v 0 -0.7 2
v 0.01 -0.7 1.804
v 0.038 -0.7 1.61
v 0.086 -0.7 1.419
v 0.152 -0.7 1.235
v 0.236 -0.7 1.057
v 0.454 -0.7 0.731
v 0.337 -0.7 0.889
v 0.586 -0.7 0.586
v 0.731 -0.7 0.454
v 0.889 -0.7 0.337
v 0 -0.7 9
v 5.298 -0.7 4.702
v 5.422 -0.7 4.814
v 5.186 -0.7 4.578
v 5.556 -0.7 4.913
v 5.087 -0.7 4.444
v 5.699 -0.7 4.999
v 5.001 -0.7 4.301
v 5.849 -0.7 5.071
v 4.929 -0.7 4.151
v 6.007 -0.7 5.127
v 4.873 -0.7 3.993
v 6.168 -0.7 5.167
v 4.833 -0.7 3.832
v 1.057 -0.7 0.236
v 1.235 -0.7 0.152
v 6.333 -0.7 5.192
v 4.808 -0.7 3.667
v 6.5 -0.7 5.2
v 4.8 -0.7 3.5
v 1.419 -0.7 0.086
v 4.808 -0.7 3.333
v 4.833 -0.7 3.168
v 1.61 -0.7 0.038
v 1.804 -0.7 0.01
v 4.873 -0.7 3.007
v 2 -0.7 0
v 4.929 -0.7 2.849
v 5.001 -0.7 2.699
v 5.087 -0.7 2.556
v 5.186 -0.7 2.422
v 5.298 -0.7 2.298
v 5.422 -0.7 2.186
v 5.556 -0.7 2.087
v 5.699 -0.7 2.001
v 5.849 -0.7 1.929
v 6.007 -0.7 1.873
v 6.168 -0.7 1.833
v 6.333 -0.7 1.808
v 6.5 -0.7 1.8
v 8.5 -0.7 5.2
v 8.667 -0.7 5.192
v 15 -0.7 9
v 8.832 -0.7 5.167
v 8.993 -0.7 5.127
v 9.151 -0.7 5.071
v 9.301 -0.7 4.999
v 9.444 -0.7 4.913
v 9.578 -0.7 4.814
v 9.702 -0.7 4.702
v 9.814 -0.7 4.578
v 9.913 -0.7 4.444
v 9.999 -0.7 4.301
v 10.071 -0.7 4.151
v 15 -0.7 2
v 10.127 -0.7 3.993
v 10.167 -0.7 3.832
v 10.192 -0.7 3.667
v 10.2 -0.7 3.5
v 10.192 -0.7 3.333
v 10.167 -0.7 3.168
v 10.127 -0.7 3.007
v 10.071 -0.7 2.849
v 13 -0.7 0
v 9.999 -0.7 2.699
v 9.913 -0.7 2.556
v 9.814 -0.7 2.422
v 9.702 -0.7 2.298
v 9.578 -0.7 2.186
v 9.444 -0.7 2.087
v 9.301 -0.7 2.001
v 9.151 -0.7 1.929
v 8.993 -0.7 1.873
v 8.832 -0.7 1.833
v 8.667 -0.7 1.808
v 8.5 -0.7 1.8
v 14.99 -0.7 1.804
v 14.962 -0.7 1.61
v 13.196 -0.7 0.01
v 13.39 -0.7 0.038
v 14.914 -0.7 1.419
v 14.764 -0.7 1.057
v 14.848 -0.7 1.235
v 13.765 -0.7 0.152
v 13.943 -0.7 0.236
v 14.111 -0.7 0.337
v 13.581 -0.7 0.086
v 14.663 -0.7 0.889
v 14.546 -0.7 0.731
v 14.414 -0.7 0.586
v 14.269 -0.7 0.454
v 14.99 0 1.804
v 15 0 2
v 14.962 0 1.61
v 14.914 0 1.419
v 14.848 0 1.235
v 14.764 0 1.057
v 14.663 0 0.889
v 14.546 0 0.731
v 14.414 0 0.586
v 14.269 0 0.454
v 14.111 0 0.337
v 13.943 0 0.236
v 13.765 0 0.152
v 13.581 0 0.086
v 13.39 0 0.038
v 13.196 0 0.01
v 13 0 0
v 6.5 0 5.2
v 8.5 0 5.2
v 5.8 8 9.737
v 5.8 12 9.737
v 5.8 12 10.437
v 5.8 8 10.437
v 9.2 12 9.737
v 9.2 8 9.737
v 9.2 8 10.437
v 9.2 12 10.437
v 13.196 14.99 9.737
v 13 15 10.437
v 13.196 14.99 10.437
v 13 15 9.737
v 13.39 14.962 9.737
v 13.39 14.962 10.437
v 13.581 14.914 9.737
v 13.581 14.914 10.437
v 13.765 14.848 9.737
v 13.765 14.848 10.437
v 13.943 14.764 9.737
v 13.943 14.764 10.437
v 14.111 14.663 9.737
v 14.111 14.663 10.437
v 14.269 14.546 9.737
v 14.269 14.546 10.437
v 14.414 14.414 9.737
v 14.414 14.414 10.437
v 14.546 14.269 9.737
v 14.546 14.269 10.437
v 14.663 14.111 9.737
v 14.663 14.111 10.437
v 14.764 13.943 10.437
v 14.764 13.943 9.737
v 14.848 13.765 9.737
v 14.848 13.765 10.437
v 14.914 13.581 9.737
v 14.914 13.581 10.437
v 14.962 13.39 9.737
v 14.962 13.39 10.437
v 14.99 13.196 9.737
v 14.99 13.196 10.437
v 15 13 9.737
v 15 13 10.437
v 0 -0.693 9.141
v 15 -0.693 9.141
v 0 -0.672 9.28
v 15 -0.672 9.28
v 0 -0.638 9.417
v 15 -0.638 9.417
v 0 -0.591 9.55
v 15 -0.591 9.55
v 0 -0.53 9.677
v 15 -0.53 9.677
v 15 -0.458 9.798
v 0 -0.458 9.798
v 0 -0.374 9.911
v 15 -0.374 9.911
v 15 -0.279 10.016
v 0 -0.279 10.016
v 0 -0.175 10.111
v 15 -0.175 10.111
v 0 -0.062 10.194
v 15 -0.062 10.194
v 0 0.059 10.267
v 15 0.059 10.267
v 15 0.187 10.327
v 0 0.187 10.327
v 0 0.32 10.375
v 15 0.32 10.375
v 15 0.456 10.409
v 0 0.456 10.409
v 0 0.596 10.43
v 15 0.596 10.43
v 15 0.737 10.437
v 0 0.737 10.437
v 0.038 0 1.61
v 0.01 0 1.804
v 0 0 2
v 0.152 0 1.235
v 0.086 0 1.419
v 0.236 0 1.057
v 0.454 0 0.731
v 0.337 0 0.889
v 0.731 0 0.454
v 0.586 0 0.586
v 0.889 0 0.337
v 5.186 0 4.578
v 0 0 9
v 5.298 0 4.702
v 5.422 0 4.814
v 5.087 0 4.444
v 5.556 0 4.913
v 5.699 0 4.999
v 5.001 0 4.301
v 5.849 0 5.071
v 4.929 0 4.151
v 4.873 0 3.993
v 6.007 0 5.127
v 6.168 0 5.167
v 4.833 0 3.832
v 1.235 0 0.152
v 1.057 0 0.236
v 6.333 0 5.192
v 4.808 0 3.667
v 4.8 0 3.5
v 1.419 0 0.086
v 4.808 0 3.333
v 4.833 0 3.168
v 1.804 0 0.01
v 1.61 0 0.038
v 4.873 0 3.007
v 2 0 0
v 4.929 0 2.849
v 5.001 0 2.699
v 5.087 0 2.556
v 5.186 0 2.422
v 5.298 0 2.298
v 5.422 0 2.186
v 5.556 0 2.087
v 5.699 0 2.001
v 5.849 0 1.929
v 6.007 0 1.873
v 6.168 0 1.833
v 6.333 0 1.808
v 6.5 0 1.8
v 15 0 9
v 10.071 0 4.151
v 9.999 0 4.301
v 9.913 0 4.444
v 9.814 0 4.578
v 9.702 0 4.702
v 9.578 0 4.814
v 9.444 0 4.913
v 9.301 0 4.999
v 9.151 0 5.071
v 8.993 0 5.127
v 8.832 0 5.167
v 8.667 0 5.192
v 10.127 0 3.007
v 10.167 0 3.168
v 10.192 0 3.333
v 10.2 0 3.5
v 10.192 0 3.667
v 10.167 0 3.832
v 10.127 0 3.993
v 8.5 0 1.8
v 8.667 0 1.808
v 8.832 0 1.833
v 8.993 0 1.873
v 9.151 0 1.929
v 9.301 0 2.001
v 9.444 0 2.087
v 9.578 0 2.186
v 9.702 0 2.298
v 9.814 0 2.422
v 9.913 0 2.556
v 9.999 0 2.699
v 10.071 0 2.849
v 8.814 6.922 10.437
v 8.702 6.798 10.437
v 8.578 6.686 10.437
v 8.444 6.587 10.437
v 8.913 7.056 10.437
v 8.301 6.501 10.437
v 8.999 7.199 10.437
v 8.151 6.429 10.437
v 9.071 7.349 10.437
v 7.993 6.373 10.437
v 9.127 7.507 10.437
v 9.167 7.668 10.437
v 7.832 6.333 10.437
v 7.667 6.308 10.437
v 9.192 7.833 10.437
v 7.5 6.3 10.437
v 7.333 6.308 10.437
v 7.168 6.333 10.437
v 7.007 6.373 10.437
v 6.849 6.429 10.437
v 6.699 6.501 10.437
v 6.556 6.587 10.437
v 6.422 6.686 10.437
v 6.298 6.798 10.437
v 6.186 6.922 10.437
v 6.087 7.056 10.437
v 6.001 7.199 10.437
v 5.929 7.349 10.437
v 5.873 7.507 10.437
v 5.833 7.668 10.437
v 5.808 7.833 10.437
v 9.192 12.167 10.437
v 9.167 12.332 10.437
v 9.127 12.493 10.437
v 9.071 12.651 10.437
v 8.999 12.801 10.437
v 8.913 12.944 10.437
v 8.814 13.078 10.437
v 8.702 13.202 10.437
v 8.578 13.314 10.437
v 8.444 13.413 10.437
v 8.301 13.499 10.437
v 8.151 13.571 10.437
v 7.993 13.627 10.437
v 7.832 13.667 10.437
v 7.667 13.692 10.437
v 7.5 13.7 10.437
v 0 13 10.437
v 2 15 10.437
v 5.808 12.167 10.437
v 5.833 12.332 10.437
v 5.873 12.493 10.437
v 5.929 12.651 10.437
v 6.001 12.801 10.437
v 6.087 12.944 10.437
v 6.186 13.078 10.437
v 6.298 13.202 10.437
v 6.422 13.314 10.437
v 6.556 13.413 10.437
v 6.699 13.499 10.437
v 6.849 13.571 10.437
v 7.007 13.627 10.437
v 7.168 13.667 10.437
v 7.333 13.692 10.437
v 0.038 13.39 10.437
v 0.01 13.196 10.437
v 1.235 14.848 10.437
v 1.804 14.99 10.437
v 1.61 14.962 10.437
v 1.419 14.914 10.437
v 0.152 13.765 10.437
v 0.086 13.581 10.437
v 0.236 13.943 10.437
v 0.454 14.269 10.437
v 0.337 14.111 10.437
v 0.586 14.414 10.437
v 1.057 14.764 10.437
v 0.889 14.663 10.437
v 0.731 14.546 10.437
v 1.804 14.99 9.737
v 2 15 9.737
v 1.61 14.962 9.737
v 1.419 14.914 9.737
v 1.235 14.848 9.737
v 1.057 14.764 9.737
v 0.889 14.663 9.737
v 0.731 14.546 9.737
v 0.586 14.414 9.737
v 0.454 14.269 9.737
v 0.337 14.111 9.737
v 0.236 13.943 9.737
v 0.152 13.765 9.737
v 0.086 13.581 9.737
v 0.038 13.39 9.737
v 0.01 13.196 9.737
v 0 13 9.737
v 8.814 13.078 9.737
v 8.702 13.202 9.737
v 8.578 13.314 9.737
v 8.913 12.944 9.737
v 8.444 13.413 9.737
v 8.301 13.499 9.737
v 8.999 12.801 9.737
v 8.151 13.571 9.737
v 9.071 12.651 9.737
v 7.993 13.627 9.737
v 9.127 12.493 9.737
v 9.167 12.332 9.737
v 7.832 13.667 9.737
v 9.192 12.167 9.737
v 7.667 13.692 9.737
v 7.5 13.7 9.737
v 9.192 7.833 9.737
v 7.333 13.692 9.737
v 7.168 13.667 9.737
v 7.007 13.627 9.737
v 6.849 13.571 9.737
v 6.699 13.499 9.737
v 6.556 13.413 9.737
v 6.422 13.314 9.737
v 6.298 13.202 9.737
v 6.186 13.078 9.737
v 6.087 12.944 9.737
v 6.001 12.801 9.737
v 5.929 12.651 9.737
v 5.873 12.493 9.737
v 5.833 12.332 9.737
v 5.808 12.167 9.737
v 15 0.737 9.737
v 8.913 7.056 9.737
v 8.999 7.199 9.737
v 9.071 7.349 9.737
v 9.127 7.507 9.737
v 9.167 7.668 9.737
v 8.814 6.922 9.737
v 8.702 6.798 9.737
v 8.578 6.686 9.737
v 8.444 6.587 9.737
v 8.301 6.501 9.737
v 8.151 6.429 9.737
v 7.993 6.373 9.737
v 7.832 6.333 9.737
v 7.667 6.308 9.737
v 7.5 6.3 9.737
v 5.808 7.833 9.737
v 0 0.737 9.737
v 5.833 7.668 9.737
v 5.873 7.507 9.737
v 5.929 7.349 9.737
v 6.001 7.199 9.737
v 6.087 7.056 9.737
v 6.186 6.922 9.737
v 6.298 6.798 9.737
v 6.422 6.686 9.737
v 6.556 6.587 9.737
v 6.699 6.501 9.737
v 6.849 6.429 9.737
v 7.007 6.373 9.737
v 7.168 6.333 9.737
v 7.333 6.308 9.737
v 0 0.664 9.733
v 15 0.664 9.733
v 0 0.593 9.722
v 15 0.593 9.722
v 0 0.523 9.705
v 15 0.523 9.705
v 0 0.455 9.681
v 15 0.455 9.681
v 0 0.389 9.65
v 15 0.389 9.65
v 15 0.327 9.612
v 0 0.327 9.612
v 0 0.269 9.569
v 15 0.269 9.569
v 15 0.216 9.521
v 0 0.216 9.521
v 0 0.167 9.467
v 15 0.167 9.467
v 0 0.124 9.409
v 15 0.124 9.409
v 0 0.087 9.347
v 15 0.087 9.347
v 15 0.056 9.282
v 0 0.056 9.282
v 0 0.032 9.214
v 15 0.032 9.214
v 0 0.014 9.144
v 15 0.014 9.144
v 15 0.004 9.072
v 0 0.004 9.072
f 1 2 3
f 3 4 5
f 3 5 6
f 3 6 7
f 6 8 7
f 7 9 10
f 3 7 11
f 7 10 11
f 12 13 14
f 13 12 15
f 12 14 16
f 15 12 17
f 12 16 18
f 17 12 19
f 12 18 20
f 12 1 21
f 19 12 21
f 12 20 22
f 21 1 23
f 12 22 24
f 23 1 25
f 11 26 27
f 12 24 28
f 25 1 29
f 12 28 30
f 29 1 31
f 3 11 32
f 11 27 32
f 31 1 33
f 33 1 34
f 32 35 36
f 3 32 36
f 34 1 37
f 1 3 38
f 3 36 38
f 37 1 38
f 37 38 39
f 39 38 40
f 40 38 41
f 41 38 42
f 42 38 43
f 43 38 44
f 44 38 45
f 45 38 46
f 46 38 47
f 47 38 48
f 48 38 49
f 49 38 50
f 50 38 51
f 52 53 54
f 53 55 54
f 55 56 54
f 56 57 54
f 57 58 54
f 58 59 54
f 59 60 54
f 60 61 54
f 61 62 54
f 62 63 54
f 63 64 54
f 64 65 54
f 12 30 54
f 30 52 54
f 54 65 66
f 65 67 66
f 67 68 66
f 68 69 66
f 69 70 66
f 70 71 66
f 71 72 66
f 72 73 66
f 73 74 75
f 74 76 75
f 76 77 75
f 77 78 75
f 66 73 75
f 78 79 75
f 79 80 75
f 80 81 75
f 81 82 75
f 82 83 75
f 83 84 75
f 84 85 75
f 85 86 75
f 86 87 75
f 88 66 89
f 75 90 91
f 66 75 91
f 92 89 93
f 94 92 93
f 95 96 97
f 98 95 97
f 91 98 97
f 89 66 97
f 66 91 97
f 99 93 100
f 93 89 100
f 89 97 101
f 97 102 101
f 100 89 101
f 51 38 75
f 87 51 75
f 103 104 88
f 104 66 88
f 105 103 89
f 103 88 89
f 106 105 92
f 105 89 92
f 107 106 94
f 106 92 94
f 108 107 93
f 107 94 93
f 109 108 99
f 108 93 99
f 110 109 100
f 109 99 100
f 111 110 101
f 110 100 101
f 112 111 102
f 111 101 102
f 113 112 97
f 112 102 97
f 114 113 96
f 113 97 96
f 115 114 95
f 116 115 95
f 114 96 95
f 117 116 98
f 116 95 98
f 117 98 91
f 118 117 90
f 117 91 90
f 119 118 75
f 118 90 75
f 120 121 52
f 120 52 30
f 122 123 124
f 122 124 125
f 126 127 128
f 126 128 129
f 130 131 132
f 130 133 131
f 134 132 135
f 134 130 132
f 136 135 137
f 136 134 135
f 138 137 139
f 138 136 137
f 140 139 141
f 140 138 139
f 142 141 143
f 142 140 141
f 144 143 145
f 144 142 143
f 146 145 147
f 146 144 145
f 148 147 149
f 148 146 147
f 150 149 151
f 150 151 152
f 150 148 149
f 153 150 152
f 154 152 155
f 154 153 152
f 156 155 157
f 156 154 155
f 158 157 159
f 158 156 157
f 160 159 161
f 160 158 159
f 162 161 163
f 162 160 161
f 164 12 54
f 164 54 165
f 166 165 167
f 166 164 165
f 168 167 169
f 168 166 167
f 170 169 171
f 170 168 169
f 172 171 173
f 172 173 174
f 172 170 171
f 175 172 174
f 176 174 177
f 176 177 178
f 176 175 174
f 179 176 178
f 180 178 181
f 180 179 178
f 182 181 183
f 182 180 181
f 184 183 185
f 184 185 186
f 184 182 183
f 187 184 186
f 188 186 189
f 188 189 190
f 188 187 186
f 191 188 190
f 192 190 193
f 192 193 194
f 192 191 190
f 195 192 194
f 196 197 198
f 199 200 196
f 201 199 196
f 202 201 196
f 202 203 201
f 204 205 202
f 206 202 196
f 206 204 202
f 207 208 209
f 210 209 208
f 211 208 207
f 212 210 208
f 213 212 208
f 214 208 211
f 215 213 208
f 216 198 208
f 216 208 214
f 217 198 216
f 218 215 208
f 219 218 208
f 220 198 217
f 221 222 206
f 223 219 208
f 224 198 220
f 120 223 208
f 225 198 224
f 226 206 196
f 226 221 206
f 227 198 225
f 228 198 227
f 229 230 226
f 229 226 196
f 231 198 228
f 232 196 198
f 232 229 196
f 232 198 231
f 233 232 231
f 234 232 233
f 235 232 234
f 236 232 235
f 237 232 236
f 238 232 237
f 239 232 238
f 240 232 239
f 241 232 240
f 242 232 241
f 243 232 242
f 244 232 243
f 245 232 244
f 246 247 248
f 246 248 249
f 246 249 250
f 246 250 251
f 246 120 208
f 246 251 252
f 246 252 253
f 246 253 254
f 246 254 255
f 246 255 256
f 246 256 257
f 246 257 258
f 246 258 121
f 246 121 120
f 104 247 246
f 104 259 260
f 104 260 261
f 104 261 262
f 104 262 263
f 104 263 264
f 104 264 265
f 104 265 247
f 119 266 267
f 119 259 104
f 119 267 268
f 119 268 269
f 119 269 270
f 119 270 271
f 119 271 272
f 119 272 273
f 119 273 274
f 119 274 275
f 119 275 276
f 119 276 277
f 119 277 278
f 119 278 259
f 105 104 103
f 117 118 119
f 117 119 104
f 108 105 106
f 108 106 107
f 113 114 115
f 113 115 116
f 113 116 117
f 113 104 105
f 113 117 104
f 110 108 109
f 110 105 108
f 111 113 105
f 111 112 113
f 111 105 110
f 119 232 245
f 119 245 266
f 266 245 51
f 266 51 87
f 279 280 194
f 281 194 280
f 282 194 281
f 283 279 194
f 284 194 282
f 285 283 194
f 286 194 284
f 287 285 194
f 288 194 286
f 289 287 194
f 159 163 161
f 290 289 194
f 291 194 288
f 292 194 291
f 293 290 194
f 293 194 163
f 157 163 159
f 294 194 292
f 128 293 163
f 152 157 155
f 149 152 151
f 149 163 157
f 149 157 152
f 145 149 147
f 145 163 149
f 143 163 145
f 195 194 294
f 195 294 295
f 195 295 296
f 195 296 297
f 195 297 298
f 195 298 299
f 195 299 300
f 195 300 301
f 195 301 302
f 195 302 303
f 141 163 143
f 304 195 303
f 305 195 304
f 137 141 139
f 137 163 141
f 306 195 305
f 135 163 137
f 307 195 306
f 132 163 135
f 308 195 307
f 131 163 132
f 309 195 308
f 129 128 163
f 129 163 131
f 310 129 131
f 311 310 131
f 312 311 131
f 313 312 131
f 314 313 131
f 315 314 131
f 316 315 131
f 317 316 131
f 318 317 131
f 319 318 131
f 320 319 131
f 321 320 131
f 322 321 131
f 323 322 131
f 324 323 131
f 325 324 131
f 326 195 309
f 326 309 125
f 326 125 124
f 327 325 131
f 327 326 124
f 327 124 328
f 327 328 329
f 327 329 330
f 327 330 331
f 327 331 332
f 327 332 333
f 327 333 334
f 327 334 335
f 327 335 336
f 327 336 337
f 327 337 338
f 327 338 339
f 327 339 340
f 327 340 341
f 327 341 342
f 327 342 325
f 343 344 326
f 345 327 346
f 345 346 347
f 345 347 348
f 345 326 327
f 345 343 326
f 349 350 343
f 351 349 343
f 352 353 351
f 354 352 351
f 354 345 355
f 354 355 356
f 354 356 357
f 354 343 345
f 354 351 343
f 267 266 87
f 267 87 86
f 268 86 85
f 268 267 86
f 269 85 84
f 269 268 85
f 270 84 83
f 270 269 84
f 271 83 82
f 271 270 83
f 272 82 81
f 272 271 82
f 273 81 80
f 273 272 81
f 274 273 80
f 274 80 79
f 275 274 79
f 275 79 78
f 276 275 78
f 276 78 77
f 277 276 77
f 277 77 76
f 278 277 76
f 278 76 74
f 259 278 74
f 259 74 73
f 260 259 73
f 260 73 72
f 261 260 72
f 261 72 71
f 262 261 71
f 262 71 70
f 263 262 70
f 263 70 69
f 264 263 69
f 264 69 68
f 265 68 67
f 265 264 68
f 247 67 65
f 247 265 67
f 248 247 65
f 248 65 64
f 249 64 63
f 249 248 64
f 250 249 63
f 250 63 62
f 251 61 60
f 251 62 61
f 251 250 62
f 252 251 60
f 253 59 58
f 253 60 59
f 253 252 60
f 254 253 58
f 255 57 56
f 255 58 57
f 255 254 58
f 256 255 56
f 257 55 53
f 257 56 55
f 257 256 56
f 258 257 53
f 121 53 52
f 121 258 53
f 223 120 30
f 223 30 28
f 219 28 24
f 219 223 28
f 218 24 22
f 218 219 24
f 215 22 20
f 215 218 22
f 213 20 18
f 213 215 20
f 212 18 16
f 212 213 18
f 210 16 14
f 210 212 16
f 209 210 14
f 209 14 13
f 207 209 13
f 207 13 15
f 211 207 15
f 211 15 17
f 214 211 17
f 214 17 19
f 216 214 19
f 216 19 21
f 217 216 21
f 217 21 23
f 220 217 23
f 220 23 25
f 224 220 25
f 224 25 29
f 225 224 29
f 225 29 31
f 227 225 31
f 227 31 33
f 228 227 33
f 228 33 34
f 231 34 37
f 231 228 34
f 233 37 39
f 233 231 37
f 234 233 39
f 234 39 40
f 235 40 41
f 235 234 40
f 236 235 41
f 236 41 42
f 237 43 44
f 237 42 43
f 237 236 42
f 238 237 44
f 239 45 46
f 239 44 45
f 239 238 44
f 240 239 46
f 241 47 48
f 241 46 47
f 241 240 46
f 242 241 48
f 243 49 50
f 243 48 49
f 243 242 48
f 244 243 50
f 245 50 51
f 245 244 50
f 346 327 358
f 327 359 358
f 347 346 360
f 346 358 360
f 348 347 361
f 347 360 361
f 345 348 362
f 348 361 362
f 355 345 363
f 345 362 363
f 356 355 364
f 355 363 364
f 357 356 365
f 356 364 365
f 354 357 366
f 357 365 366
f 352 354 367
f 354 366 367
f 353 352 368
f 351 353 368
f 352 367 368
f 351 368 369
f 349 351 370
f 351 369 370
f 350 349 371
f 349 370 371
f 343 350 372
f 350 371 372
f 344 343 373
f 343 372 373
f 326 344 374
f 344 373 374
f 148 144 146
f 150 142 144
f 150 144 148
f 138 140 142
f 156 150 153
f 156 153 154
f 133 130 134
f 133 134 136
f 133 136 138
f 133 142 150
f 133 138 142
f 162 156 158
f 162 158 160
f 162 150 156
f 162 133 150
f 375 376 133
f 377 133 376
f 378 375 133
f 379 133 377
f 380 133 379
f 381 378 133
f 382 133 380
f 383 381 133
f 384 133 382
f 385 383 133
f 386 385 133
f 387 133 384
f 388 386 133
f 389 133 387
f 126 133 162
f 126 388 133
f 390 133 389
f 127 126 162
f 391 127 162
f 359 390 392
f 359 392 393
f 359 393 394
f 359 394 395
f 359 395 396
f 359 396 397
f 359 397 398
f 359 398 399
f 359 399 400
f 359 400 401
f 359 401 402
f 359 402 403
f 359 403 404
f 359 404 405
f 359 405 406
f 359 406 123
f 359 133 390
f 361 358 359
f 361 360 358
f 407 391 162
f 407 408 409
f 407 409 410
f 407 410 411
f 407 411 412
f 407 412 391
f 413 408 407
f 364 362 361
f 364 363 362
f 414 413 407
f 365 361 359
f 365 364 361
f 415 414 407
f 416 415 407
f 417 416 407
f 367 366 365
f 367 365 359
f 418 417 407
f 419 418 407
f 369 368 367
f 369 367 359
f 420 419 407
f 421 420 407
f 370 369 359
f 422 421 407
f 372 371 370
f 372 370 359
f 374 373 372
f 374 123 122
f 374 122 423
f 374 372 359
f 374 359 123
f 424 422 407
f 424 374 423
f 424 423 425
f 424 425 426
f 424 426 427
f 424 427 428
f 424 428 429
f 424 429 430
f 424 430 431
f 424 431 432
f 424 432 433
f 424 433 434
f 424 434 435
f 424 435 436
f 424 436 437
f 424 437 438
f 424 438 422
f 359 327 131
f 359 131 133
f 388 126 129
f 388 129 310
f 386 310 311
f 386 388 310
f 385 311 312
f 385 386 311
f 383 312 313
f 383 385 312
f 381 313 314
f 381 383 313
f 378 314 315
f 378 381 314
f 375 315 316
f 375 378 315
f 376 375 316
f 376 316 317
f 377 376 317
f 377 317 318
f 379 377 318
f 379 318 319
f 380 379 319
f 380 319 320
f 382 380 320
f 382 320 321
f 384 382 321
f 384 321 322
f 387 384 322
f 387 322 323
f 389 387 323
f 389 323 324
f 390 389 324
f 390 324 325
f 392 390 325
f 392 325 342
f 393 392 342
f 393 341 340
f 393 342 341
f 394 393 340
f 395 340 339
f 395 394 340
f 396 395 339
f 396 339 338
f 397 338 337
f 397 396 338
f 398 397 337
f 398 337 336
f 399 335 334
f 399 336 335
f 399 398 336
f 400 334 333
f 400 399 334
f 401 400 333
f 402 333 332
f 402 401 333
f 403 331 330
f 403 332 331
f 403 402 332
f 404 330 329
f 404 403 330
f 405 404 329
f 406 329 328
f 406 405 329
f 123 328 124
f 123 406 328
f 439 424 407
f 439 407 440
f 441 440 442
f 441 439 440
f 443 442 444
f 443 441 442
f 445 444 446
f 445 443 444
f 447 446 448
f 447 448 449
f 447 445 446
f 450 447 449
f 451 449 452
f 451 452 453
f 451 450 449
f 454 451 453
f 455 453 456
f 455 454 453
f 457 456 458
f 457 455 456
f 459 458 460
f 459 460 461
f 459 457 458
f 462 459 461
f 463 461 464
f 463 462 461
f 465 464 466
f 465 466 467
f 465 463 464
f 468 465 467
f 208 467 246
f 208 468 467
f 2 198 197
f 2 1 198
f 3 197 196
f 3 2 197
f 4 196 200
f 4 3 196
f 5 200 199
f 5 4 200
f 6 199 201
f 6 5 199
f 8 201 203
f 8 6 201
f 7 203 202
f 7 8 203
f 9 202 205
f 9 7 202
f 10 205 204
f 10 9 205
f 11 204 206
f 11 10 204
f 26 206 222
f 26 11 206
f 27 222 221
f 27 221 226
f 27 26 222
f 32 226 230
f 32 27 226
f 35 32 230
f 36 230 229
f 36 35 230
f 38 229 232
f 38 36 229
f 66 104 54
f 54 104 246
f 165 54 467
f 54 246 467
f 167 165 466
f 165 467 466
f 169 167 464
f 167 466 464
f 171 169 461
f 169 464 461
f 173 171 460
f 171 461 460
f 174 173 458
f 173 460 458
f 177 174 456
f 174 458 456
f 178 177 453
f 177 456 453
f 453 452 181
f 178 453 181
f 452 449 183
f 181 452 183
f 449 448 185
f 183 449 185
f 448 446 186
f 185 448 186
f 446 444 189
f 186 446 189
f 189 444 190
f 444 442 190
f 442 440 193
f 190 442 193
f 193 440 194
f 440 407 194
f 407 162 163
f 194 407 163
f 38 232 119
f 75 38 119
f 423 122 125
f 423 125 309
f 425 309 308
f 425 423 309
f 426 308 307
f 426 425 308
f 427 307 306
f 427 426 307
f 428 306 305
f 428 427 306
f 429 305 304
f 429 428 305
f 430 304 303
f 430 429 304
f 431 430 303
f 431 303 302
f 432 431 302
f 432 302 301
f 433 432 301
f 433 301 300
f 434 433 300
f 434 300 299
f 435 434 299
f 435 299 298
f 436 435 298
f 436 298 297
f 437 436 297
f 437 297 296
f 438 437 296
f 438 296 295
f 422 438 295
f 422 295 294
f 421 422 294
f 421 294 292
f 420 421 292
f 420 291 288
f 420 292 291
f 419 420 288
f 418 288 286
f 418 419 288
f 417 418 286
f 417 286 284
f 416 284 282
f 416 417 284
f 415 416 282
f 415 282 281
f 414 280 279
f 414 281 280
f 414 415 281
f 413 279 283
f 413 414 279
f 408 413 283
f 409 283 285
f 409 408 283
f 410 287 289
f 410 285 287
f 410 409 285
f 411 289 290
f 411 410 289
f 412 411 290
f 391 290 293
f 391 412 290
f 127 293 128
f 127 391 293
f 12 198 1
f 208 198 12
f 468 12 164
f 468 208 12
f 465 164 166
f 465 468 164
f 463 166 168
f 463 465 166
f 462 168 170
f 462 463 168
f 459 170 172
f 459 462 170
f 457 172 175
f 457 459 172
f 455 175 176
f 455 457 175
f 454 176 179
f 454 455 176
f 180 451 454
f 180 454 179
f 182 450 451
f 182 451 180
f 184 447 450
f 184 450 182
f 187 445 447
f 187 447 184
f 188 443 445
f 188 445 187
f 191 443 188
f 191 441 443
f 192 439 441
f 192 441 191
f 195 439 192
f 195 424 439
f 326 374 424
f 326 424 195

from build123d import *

# Parameters (mm, degrees)
SKETCH1_W          = 15
SKETCH1_H          = 9
BASE_FLANGE1_DEPTH = 0.7
EDGE_FLANGE1_DEPTH = 15
CUT_EXTRUDE1_DEPTH = 10
FILLET1_R          = 2
CUT_EXTRUDE2_DEPTH = 10


# Sheet-metal steps are written as plain solids
with BuildPart() as part:
    # Sketch1 → Base-Flange1 (new body)
    with BuildSketch(Plane(origin=(0, 0, 0), x_dir=(1, 0, 0), z_dir=(0, 1, 0))):
        with Locations((7.5, -4.5)):
            Rectangle(SKETCH1_W, SKETCH1_H)
    extrude(amount=-BASE_FLANGE1_DEPTH)

    # Edge-Flange1 section (across the edge) → Edge-Flange1 (add)
    with BuildSketch(Plane(origin=(0, 0, 9.7366), x_dir=(0, 0, -1), z_dir=(1, 0, 0))):
        with BuildLine():
            Line((-0.7, 0.7366), (-0.7, 15))
            Line((-0.7, 15), (0, 15))
            Line((0, 15), (0, 0.7366))
            ThreePointArc((0, 0.7366), (0.215745145, 0.215745145), (0.7366, 0))
            Line((0.7366, 0), (0.7366, -0.7))
            ThreePointArc((0.7366, -0.7), (-0.279229602, -0.279229602), (-0.7, 0.7366))
        make_face()
    extrude(amount=EDGE_FLANGE1_DEPTH)

    # Sketch7 → Cut-Extrude1 (cut)
    with BuildSketch(Plane(origin=(0, 0, 0), x_dir=(1, 0, 0), z_dir=(0, 1, 0))):
        with BuildLine():
            Line((8.5, -5.2), (6.5, -5.2))
            ThreePointArc((6.5, -5.2), (4.8, -3.5), (6.5, -1.8))
            Line((6.5, -1.8), (8.5, -1.8))
            ThreePointArc((8.5, -1.8), (10.2, -3.5), (8.5, -5.2))
        make_face()
    extrude(amount=-CUT_EXTRUDE1_DEPTH, mode=Mode.SUBTRACT)

    # Fillet1
    fillet1_edges = [part.edges().sort_by_distance(p)[0] for p in [
        (0, 15, 10.0866),
        (15, 15, 10.0866),
        (0, -0.35, 0),
        (15, -0.35, 0),
    ]]
    fillet(fillet1_edges, radius=FILLET1_R)

    # Sketch8 → Cut-Extrude2 (cut)
    with BuildSketch(Plane(origin=(0, 0, 9.7366), x_dir=(-1, 0, 0), z_dir=(0, 0, -1))):
        with BuildLine():
            Line((-5.8, 12), (-5.8, 8))
            ThreePointArc((-5.8, 8), (-7.5, 6.3), (-9.2, 8))
            Line((-9.2, 8), (-9.2, 12))
            ThreePointArc((-9.2, 12), (-7.5, 13.7), (-5.8, 12))
        make_face()
    extrude(amount=-CUT_EXTRUDE2_DEPTH, mode=Mode.SUBTRACT)


solid = part.part
